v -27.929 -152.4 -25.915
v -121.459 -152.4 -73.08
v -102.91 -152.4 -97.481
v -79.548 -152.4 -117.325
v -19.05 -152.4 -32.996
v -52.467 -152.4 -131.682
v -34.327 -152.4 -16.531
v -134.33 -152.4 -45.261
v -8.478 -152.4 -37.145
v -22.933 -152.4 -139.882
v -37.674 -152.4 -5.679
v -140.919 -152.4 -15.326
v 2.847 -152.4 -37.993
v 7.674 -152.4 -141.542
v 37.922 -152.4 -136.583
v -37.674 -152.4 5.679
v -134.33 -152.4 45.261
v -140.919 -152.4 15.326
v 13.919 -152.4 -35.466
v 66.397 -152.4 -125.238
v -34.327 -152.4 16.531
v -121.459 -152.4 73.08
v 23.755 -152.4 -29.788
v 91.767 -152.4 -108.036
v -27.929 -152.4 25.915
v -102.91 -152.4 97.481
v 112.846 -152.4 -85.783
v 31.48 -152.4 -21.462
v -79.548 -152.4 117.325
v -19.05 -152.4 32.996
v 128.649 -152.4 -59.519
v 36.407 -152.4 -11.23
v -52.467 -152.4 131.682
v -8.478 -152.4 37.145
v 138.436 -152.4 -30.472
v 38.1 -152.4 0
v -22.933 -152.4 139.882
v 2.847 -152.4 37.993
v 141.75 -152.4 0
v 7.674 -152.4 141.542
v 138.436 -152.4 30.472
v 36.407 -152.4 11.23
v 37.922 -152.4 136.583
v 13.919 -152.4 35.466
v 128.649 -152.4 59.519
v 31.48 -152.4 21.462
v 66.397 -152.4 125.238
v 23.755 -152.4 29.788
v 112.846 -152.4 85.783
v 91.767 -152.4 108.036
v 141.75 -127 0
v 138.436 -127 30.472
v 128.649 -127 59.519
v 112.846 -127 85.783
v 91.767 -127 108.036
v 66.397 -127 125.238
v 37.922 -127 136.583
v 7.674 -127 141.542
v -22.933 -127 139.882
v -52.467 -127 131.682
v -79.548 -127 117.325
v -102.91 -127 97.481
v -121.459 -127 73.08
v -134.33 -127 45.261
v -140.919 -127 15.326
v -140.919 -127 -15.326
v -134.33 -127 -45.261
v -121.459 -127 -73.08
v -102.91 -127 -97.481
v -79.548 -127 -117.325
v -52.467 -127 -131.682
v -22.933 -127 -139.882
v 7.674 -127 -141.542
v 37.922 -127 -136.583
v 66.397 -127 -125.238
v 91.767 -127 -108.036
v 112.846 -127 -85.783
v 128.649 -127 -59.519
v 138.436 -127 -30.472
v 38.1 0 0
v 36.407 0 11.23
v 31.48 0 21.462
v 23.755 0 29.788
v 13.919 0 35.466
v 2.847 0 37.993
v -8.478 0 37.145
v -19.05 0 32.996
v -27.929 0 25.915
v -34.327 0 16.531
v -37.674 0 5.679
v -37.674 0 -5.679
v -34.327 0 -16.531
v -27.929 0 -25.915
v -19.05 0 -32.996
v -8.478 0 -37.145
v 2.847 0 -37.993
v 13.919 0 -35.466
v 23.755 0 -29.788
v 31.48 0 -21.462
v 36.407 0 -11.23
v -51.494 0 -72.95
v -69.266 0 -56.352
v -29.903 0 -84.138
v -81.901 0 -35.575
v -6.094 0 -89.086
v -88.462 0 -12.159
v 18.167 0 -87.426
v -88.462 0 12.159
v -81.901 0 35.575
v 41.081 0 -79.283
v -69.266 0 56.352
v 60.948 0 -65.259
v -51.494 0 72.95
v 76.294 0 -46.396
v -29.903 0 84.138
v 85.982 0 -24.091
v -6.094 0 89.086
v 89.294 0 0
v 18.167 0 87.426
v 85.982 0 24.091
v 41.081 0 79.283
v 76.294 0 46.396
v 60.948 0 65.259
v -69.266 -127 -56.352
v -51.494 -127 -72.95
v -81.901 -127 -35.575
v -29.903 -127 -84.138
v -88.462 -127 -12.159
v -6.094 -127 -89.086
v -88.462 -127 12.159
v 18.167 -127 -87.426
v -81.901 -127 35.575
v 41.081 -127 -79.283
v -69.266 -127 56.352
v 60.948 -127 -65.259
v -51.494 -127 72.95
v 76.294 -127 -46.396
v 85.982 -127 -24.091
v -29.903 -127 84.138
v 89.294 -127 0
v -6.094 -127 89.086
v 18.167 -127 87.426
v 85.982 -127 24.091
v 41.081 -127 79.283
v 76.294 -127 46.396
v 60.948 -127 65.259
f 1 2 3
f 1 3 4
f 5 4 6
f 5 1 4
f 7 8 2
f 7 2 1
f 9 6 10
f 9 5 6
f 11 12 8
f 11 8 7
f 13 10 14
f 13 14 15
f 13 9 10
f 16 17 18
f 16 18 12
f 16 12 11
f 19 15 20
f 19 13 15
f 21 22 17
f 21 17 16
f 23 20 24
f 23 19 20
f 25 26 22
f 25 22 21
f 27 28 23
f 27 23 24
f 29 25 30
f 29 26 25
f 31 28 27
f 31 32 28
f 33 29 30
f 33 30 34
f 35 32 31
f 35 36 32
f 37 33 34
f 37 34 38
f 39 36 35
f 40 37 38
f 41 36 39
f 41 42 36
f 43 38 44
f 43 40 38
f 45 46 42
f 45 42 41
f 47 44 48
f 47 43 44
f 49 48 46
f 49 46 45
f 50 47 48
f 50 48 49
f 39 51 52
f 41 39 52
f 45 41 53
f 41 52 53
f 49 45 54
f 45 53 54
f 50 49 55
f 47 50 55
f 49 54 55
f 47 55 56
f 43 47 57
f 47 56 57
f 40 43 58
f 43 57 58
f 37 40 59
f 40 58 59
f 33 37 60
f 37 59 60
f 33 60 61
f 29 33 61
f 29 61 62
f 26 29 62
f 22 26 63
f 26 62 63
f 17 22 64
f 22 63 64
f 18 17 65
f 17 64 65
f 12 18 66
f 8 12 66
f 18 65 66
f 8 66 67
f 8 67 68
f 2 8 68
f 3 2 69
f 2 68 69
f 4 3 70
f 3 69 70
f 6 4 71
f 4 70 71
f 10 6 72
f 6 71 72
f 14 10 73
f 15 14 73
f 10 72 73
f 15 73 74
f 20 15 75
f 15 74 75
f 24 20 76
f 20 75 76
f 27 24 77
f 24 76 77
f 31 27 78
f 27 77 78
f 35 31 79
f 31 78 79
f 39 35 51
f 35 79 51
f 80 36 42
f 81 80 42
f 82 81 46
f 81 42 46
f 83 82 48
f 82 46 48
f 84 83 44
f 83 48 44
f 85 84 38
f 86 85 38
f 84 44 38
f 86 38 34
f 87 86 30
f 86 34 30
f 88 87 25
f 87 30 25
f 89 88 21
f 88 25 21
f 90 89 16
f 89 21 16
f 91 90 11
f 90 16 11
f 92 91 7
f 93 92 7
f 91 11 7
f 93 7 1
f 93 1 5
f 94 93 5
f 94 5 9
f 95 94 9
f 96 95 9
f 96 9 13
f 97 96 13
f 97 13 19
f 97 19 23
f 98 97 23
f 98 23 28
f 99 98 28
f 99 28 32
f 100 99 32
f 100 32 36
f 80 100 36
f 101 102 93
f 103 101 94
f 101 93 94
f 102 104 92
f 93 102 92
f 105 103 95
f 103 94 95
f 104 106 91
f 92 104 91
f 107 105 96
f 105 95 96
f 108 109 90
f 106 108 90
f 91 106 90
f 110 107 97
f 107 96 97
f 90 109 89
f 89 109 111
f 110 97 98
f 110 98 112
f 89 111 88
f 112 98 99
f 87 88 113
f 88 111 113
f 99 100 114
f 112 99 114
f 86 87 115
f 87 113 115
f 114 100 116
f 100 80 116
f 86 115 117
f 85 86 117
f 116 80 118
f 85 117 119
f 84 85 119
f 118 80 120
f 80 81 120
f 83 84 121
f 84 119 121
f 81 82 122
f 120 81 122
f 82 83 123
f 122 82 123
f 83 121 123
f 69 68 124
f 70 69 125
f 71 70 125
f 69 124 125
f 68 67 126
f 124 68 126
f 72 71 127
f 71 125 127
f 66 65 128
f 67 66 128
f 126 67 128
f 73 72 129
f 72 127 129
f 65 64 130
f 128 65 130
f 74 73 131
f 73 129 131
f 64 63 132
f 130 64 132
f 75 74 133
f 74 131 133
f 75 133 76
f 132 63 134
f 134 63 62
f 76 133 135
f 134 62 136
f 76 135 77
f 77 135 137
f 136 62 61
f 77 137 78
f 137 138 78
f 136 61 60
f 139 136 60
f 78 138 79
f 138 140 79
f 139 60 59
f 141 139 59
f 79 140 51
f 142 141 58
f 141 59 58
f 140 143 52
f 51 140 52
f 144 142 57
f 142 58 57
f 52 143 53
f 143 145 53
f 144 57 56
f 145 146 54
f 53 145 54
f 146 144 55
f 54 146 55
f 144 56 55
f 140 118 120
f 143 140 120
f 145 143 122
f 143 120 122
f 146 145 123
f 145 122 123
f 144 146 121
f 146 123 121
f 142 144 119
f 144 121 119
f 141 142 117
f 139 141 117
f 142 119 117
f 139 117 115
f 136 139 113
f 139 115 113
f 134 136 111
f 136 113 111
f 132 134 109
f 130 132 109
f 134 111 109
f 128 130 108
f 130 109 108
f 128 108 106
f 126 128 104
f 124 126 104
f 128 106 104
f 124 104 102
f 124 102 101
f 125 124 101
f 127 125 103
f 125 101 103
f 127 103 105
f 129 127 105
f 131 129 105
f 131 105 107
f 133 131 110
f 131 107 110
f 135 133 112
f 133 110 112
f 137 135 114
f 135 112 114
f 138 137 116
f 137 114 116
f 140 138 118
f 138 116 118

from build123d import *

# Parameters (mm, degrees)
F0_R     = 89.2937
F1_DEPTH = 127
F2_R     = 141.749676
F3_DEPTH = 25.4
F5_D     = 76.2


with BuildPart() as f1:
    # F0 (on Front) → F1 (new body)
    with BuildSketch(Plane.XZ):
        Circle(F0_R)
    extrude(amount=F1_DEPTH)

    # F2 (on face) → F3 (join)
    with BuildSketch(Plane.XZ.offset(127)):
        Circle(F2_R)
    extrude(amount=F3_DEPTH)

    # F5 (through all)
    with Locations(Plane(origin=(0, 0, 0), x_dir=(-1, 0, 0), z_dir=(0, 1, 0))):
        with Locations((0, 0)):
            Hole(F5_D / 2)


solid = f1.part
